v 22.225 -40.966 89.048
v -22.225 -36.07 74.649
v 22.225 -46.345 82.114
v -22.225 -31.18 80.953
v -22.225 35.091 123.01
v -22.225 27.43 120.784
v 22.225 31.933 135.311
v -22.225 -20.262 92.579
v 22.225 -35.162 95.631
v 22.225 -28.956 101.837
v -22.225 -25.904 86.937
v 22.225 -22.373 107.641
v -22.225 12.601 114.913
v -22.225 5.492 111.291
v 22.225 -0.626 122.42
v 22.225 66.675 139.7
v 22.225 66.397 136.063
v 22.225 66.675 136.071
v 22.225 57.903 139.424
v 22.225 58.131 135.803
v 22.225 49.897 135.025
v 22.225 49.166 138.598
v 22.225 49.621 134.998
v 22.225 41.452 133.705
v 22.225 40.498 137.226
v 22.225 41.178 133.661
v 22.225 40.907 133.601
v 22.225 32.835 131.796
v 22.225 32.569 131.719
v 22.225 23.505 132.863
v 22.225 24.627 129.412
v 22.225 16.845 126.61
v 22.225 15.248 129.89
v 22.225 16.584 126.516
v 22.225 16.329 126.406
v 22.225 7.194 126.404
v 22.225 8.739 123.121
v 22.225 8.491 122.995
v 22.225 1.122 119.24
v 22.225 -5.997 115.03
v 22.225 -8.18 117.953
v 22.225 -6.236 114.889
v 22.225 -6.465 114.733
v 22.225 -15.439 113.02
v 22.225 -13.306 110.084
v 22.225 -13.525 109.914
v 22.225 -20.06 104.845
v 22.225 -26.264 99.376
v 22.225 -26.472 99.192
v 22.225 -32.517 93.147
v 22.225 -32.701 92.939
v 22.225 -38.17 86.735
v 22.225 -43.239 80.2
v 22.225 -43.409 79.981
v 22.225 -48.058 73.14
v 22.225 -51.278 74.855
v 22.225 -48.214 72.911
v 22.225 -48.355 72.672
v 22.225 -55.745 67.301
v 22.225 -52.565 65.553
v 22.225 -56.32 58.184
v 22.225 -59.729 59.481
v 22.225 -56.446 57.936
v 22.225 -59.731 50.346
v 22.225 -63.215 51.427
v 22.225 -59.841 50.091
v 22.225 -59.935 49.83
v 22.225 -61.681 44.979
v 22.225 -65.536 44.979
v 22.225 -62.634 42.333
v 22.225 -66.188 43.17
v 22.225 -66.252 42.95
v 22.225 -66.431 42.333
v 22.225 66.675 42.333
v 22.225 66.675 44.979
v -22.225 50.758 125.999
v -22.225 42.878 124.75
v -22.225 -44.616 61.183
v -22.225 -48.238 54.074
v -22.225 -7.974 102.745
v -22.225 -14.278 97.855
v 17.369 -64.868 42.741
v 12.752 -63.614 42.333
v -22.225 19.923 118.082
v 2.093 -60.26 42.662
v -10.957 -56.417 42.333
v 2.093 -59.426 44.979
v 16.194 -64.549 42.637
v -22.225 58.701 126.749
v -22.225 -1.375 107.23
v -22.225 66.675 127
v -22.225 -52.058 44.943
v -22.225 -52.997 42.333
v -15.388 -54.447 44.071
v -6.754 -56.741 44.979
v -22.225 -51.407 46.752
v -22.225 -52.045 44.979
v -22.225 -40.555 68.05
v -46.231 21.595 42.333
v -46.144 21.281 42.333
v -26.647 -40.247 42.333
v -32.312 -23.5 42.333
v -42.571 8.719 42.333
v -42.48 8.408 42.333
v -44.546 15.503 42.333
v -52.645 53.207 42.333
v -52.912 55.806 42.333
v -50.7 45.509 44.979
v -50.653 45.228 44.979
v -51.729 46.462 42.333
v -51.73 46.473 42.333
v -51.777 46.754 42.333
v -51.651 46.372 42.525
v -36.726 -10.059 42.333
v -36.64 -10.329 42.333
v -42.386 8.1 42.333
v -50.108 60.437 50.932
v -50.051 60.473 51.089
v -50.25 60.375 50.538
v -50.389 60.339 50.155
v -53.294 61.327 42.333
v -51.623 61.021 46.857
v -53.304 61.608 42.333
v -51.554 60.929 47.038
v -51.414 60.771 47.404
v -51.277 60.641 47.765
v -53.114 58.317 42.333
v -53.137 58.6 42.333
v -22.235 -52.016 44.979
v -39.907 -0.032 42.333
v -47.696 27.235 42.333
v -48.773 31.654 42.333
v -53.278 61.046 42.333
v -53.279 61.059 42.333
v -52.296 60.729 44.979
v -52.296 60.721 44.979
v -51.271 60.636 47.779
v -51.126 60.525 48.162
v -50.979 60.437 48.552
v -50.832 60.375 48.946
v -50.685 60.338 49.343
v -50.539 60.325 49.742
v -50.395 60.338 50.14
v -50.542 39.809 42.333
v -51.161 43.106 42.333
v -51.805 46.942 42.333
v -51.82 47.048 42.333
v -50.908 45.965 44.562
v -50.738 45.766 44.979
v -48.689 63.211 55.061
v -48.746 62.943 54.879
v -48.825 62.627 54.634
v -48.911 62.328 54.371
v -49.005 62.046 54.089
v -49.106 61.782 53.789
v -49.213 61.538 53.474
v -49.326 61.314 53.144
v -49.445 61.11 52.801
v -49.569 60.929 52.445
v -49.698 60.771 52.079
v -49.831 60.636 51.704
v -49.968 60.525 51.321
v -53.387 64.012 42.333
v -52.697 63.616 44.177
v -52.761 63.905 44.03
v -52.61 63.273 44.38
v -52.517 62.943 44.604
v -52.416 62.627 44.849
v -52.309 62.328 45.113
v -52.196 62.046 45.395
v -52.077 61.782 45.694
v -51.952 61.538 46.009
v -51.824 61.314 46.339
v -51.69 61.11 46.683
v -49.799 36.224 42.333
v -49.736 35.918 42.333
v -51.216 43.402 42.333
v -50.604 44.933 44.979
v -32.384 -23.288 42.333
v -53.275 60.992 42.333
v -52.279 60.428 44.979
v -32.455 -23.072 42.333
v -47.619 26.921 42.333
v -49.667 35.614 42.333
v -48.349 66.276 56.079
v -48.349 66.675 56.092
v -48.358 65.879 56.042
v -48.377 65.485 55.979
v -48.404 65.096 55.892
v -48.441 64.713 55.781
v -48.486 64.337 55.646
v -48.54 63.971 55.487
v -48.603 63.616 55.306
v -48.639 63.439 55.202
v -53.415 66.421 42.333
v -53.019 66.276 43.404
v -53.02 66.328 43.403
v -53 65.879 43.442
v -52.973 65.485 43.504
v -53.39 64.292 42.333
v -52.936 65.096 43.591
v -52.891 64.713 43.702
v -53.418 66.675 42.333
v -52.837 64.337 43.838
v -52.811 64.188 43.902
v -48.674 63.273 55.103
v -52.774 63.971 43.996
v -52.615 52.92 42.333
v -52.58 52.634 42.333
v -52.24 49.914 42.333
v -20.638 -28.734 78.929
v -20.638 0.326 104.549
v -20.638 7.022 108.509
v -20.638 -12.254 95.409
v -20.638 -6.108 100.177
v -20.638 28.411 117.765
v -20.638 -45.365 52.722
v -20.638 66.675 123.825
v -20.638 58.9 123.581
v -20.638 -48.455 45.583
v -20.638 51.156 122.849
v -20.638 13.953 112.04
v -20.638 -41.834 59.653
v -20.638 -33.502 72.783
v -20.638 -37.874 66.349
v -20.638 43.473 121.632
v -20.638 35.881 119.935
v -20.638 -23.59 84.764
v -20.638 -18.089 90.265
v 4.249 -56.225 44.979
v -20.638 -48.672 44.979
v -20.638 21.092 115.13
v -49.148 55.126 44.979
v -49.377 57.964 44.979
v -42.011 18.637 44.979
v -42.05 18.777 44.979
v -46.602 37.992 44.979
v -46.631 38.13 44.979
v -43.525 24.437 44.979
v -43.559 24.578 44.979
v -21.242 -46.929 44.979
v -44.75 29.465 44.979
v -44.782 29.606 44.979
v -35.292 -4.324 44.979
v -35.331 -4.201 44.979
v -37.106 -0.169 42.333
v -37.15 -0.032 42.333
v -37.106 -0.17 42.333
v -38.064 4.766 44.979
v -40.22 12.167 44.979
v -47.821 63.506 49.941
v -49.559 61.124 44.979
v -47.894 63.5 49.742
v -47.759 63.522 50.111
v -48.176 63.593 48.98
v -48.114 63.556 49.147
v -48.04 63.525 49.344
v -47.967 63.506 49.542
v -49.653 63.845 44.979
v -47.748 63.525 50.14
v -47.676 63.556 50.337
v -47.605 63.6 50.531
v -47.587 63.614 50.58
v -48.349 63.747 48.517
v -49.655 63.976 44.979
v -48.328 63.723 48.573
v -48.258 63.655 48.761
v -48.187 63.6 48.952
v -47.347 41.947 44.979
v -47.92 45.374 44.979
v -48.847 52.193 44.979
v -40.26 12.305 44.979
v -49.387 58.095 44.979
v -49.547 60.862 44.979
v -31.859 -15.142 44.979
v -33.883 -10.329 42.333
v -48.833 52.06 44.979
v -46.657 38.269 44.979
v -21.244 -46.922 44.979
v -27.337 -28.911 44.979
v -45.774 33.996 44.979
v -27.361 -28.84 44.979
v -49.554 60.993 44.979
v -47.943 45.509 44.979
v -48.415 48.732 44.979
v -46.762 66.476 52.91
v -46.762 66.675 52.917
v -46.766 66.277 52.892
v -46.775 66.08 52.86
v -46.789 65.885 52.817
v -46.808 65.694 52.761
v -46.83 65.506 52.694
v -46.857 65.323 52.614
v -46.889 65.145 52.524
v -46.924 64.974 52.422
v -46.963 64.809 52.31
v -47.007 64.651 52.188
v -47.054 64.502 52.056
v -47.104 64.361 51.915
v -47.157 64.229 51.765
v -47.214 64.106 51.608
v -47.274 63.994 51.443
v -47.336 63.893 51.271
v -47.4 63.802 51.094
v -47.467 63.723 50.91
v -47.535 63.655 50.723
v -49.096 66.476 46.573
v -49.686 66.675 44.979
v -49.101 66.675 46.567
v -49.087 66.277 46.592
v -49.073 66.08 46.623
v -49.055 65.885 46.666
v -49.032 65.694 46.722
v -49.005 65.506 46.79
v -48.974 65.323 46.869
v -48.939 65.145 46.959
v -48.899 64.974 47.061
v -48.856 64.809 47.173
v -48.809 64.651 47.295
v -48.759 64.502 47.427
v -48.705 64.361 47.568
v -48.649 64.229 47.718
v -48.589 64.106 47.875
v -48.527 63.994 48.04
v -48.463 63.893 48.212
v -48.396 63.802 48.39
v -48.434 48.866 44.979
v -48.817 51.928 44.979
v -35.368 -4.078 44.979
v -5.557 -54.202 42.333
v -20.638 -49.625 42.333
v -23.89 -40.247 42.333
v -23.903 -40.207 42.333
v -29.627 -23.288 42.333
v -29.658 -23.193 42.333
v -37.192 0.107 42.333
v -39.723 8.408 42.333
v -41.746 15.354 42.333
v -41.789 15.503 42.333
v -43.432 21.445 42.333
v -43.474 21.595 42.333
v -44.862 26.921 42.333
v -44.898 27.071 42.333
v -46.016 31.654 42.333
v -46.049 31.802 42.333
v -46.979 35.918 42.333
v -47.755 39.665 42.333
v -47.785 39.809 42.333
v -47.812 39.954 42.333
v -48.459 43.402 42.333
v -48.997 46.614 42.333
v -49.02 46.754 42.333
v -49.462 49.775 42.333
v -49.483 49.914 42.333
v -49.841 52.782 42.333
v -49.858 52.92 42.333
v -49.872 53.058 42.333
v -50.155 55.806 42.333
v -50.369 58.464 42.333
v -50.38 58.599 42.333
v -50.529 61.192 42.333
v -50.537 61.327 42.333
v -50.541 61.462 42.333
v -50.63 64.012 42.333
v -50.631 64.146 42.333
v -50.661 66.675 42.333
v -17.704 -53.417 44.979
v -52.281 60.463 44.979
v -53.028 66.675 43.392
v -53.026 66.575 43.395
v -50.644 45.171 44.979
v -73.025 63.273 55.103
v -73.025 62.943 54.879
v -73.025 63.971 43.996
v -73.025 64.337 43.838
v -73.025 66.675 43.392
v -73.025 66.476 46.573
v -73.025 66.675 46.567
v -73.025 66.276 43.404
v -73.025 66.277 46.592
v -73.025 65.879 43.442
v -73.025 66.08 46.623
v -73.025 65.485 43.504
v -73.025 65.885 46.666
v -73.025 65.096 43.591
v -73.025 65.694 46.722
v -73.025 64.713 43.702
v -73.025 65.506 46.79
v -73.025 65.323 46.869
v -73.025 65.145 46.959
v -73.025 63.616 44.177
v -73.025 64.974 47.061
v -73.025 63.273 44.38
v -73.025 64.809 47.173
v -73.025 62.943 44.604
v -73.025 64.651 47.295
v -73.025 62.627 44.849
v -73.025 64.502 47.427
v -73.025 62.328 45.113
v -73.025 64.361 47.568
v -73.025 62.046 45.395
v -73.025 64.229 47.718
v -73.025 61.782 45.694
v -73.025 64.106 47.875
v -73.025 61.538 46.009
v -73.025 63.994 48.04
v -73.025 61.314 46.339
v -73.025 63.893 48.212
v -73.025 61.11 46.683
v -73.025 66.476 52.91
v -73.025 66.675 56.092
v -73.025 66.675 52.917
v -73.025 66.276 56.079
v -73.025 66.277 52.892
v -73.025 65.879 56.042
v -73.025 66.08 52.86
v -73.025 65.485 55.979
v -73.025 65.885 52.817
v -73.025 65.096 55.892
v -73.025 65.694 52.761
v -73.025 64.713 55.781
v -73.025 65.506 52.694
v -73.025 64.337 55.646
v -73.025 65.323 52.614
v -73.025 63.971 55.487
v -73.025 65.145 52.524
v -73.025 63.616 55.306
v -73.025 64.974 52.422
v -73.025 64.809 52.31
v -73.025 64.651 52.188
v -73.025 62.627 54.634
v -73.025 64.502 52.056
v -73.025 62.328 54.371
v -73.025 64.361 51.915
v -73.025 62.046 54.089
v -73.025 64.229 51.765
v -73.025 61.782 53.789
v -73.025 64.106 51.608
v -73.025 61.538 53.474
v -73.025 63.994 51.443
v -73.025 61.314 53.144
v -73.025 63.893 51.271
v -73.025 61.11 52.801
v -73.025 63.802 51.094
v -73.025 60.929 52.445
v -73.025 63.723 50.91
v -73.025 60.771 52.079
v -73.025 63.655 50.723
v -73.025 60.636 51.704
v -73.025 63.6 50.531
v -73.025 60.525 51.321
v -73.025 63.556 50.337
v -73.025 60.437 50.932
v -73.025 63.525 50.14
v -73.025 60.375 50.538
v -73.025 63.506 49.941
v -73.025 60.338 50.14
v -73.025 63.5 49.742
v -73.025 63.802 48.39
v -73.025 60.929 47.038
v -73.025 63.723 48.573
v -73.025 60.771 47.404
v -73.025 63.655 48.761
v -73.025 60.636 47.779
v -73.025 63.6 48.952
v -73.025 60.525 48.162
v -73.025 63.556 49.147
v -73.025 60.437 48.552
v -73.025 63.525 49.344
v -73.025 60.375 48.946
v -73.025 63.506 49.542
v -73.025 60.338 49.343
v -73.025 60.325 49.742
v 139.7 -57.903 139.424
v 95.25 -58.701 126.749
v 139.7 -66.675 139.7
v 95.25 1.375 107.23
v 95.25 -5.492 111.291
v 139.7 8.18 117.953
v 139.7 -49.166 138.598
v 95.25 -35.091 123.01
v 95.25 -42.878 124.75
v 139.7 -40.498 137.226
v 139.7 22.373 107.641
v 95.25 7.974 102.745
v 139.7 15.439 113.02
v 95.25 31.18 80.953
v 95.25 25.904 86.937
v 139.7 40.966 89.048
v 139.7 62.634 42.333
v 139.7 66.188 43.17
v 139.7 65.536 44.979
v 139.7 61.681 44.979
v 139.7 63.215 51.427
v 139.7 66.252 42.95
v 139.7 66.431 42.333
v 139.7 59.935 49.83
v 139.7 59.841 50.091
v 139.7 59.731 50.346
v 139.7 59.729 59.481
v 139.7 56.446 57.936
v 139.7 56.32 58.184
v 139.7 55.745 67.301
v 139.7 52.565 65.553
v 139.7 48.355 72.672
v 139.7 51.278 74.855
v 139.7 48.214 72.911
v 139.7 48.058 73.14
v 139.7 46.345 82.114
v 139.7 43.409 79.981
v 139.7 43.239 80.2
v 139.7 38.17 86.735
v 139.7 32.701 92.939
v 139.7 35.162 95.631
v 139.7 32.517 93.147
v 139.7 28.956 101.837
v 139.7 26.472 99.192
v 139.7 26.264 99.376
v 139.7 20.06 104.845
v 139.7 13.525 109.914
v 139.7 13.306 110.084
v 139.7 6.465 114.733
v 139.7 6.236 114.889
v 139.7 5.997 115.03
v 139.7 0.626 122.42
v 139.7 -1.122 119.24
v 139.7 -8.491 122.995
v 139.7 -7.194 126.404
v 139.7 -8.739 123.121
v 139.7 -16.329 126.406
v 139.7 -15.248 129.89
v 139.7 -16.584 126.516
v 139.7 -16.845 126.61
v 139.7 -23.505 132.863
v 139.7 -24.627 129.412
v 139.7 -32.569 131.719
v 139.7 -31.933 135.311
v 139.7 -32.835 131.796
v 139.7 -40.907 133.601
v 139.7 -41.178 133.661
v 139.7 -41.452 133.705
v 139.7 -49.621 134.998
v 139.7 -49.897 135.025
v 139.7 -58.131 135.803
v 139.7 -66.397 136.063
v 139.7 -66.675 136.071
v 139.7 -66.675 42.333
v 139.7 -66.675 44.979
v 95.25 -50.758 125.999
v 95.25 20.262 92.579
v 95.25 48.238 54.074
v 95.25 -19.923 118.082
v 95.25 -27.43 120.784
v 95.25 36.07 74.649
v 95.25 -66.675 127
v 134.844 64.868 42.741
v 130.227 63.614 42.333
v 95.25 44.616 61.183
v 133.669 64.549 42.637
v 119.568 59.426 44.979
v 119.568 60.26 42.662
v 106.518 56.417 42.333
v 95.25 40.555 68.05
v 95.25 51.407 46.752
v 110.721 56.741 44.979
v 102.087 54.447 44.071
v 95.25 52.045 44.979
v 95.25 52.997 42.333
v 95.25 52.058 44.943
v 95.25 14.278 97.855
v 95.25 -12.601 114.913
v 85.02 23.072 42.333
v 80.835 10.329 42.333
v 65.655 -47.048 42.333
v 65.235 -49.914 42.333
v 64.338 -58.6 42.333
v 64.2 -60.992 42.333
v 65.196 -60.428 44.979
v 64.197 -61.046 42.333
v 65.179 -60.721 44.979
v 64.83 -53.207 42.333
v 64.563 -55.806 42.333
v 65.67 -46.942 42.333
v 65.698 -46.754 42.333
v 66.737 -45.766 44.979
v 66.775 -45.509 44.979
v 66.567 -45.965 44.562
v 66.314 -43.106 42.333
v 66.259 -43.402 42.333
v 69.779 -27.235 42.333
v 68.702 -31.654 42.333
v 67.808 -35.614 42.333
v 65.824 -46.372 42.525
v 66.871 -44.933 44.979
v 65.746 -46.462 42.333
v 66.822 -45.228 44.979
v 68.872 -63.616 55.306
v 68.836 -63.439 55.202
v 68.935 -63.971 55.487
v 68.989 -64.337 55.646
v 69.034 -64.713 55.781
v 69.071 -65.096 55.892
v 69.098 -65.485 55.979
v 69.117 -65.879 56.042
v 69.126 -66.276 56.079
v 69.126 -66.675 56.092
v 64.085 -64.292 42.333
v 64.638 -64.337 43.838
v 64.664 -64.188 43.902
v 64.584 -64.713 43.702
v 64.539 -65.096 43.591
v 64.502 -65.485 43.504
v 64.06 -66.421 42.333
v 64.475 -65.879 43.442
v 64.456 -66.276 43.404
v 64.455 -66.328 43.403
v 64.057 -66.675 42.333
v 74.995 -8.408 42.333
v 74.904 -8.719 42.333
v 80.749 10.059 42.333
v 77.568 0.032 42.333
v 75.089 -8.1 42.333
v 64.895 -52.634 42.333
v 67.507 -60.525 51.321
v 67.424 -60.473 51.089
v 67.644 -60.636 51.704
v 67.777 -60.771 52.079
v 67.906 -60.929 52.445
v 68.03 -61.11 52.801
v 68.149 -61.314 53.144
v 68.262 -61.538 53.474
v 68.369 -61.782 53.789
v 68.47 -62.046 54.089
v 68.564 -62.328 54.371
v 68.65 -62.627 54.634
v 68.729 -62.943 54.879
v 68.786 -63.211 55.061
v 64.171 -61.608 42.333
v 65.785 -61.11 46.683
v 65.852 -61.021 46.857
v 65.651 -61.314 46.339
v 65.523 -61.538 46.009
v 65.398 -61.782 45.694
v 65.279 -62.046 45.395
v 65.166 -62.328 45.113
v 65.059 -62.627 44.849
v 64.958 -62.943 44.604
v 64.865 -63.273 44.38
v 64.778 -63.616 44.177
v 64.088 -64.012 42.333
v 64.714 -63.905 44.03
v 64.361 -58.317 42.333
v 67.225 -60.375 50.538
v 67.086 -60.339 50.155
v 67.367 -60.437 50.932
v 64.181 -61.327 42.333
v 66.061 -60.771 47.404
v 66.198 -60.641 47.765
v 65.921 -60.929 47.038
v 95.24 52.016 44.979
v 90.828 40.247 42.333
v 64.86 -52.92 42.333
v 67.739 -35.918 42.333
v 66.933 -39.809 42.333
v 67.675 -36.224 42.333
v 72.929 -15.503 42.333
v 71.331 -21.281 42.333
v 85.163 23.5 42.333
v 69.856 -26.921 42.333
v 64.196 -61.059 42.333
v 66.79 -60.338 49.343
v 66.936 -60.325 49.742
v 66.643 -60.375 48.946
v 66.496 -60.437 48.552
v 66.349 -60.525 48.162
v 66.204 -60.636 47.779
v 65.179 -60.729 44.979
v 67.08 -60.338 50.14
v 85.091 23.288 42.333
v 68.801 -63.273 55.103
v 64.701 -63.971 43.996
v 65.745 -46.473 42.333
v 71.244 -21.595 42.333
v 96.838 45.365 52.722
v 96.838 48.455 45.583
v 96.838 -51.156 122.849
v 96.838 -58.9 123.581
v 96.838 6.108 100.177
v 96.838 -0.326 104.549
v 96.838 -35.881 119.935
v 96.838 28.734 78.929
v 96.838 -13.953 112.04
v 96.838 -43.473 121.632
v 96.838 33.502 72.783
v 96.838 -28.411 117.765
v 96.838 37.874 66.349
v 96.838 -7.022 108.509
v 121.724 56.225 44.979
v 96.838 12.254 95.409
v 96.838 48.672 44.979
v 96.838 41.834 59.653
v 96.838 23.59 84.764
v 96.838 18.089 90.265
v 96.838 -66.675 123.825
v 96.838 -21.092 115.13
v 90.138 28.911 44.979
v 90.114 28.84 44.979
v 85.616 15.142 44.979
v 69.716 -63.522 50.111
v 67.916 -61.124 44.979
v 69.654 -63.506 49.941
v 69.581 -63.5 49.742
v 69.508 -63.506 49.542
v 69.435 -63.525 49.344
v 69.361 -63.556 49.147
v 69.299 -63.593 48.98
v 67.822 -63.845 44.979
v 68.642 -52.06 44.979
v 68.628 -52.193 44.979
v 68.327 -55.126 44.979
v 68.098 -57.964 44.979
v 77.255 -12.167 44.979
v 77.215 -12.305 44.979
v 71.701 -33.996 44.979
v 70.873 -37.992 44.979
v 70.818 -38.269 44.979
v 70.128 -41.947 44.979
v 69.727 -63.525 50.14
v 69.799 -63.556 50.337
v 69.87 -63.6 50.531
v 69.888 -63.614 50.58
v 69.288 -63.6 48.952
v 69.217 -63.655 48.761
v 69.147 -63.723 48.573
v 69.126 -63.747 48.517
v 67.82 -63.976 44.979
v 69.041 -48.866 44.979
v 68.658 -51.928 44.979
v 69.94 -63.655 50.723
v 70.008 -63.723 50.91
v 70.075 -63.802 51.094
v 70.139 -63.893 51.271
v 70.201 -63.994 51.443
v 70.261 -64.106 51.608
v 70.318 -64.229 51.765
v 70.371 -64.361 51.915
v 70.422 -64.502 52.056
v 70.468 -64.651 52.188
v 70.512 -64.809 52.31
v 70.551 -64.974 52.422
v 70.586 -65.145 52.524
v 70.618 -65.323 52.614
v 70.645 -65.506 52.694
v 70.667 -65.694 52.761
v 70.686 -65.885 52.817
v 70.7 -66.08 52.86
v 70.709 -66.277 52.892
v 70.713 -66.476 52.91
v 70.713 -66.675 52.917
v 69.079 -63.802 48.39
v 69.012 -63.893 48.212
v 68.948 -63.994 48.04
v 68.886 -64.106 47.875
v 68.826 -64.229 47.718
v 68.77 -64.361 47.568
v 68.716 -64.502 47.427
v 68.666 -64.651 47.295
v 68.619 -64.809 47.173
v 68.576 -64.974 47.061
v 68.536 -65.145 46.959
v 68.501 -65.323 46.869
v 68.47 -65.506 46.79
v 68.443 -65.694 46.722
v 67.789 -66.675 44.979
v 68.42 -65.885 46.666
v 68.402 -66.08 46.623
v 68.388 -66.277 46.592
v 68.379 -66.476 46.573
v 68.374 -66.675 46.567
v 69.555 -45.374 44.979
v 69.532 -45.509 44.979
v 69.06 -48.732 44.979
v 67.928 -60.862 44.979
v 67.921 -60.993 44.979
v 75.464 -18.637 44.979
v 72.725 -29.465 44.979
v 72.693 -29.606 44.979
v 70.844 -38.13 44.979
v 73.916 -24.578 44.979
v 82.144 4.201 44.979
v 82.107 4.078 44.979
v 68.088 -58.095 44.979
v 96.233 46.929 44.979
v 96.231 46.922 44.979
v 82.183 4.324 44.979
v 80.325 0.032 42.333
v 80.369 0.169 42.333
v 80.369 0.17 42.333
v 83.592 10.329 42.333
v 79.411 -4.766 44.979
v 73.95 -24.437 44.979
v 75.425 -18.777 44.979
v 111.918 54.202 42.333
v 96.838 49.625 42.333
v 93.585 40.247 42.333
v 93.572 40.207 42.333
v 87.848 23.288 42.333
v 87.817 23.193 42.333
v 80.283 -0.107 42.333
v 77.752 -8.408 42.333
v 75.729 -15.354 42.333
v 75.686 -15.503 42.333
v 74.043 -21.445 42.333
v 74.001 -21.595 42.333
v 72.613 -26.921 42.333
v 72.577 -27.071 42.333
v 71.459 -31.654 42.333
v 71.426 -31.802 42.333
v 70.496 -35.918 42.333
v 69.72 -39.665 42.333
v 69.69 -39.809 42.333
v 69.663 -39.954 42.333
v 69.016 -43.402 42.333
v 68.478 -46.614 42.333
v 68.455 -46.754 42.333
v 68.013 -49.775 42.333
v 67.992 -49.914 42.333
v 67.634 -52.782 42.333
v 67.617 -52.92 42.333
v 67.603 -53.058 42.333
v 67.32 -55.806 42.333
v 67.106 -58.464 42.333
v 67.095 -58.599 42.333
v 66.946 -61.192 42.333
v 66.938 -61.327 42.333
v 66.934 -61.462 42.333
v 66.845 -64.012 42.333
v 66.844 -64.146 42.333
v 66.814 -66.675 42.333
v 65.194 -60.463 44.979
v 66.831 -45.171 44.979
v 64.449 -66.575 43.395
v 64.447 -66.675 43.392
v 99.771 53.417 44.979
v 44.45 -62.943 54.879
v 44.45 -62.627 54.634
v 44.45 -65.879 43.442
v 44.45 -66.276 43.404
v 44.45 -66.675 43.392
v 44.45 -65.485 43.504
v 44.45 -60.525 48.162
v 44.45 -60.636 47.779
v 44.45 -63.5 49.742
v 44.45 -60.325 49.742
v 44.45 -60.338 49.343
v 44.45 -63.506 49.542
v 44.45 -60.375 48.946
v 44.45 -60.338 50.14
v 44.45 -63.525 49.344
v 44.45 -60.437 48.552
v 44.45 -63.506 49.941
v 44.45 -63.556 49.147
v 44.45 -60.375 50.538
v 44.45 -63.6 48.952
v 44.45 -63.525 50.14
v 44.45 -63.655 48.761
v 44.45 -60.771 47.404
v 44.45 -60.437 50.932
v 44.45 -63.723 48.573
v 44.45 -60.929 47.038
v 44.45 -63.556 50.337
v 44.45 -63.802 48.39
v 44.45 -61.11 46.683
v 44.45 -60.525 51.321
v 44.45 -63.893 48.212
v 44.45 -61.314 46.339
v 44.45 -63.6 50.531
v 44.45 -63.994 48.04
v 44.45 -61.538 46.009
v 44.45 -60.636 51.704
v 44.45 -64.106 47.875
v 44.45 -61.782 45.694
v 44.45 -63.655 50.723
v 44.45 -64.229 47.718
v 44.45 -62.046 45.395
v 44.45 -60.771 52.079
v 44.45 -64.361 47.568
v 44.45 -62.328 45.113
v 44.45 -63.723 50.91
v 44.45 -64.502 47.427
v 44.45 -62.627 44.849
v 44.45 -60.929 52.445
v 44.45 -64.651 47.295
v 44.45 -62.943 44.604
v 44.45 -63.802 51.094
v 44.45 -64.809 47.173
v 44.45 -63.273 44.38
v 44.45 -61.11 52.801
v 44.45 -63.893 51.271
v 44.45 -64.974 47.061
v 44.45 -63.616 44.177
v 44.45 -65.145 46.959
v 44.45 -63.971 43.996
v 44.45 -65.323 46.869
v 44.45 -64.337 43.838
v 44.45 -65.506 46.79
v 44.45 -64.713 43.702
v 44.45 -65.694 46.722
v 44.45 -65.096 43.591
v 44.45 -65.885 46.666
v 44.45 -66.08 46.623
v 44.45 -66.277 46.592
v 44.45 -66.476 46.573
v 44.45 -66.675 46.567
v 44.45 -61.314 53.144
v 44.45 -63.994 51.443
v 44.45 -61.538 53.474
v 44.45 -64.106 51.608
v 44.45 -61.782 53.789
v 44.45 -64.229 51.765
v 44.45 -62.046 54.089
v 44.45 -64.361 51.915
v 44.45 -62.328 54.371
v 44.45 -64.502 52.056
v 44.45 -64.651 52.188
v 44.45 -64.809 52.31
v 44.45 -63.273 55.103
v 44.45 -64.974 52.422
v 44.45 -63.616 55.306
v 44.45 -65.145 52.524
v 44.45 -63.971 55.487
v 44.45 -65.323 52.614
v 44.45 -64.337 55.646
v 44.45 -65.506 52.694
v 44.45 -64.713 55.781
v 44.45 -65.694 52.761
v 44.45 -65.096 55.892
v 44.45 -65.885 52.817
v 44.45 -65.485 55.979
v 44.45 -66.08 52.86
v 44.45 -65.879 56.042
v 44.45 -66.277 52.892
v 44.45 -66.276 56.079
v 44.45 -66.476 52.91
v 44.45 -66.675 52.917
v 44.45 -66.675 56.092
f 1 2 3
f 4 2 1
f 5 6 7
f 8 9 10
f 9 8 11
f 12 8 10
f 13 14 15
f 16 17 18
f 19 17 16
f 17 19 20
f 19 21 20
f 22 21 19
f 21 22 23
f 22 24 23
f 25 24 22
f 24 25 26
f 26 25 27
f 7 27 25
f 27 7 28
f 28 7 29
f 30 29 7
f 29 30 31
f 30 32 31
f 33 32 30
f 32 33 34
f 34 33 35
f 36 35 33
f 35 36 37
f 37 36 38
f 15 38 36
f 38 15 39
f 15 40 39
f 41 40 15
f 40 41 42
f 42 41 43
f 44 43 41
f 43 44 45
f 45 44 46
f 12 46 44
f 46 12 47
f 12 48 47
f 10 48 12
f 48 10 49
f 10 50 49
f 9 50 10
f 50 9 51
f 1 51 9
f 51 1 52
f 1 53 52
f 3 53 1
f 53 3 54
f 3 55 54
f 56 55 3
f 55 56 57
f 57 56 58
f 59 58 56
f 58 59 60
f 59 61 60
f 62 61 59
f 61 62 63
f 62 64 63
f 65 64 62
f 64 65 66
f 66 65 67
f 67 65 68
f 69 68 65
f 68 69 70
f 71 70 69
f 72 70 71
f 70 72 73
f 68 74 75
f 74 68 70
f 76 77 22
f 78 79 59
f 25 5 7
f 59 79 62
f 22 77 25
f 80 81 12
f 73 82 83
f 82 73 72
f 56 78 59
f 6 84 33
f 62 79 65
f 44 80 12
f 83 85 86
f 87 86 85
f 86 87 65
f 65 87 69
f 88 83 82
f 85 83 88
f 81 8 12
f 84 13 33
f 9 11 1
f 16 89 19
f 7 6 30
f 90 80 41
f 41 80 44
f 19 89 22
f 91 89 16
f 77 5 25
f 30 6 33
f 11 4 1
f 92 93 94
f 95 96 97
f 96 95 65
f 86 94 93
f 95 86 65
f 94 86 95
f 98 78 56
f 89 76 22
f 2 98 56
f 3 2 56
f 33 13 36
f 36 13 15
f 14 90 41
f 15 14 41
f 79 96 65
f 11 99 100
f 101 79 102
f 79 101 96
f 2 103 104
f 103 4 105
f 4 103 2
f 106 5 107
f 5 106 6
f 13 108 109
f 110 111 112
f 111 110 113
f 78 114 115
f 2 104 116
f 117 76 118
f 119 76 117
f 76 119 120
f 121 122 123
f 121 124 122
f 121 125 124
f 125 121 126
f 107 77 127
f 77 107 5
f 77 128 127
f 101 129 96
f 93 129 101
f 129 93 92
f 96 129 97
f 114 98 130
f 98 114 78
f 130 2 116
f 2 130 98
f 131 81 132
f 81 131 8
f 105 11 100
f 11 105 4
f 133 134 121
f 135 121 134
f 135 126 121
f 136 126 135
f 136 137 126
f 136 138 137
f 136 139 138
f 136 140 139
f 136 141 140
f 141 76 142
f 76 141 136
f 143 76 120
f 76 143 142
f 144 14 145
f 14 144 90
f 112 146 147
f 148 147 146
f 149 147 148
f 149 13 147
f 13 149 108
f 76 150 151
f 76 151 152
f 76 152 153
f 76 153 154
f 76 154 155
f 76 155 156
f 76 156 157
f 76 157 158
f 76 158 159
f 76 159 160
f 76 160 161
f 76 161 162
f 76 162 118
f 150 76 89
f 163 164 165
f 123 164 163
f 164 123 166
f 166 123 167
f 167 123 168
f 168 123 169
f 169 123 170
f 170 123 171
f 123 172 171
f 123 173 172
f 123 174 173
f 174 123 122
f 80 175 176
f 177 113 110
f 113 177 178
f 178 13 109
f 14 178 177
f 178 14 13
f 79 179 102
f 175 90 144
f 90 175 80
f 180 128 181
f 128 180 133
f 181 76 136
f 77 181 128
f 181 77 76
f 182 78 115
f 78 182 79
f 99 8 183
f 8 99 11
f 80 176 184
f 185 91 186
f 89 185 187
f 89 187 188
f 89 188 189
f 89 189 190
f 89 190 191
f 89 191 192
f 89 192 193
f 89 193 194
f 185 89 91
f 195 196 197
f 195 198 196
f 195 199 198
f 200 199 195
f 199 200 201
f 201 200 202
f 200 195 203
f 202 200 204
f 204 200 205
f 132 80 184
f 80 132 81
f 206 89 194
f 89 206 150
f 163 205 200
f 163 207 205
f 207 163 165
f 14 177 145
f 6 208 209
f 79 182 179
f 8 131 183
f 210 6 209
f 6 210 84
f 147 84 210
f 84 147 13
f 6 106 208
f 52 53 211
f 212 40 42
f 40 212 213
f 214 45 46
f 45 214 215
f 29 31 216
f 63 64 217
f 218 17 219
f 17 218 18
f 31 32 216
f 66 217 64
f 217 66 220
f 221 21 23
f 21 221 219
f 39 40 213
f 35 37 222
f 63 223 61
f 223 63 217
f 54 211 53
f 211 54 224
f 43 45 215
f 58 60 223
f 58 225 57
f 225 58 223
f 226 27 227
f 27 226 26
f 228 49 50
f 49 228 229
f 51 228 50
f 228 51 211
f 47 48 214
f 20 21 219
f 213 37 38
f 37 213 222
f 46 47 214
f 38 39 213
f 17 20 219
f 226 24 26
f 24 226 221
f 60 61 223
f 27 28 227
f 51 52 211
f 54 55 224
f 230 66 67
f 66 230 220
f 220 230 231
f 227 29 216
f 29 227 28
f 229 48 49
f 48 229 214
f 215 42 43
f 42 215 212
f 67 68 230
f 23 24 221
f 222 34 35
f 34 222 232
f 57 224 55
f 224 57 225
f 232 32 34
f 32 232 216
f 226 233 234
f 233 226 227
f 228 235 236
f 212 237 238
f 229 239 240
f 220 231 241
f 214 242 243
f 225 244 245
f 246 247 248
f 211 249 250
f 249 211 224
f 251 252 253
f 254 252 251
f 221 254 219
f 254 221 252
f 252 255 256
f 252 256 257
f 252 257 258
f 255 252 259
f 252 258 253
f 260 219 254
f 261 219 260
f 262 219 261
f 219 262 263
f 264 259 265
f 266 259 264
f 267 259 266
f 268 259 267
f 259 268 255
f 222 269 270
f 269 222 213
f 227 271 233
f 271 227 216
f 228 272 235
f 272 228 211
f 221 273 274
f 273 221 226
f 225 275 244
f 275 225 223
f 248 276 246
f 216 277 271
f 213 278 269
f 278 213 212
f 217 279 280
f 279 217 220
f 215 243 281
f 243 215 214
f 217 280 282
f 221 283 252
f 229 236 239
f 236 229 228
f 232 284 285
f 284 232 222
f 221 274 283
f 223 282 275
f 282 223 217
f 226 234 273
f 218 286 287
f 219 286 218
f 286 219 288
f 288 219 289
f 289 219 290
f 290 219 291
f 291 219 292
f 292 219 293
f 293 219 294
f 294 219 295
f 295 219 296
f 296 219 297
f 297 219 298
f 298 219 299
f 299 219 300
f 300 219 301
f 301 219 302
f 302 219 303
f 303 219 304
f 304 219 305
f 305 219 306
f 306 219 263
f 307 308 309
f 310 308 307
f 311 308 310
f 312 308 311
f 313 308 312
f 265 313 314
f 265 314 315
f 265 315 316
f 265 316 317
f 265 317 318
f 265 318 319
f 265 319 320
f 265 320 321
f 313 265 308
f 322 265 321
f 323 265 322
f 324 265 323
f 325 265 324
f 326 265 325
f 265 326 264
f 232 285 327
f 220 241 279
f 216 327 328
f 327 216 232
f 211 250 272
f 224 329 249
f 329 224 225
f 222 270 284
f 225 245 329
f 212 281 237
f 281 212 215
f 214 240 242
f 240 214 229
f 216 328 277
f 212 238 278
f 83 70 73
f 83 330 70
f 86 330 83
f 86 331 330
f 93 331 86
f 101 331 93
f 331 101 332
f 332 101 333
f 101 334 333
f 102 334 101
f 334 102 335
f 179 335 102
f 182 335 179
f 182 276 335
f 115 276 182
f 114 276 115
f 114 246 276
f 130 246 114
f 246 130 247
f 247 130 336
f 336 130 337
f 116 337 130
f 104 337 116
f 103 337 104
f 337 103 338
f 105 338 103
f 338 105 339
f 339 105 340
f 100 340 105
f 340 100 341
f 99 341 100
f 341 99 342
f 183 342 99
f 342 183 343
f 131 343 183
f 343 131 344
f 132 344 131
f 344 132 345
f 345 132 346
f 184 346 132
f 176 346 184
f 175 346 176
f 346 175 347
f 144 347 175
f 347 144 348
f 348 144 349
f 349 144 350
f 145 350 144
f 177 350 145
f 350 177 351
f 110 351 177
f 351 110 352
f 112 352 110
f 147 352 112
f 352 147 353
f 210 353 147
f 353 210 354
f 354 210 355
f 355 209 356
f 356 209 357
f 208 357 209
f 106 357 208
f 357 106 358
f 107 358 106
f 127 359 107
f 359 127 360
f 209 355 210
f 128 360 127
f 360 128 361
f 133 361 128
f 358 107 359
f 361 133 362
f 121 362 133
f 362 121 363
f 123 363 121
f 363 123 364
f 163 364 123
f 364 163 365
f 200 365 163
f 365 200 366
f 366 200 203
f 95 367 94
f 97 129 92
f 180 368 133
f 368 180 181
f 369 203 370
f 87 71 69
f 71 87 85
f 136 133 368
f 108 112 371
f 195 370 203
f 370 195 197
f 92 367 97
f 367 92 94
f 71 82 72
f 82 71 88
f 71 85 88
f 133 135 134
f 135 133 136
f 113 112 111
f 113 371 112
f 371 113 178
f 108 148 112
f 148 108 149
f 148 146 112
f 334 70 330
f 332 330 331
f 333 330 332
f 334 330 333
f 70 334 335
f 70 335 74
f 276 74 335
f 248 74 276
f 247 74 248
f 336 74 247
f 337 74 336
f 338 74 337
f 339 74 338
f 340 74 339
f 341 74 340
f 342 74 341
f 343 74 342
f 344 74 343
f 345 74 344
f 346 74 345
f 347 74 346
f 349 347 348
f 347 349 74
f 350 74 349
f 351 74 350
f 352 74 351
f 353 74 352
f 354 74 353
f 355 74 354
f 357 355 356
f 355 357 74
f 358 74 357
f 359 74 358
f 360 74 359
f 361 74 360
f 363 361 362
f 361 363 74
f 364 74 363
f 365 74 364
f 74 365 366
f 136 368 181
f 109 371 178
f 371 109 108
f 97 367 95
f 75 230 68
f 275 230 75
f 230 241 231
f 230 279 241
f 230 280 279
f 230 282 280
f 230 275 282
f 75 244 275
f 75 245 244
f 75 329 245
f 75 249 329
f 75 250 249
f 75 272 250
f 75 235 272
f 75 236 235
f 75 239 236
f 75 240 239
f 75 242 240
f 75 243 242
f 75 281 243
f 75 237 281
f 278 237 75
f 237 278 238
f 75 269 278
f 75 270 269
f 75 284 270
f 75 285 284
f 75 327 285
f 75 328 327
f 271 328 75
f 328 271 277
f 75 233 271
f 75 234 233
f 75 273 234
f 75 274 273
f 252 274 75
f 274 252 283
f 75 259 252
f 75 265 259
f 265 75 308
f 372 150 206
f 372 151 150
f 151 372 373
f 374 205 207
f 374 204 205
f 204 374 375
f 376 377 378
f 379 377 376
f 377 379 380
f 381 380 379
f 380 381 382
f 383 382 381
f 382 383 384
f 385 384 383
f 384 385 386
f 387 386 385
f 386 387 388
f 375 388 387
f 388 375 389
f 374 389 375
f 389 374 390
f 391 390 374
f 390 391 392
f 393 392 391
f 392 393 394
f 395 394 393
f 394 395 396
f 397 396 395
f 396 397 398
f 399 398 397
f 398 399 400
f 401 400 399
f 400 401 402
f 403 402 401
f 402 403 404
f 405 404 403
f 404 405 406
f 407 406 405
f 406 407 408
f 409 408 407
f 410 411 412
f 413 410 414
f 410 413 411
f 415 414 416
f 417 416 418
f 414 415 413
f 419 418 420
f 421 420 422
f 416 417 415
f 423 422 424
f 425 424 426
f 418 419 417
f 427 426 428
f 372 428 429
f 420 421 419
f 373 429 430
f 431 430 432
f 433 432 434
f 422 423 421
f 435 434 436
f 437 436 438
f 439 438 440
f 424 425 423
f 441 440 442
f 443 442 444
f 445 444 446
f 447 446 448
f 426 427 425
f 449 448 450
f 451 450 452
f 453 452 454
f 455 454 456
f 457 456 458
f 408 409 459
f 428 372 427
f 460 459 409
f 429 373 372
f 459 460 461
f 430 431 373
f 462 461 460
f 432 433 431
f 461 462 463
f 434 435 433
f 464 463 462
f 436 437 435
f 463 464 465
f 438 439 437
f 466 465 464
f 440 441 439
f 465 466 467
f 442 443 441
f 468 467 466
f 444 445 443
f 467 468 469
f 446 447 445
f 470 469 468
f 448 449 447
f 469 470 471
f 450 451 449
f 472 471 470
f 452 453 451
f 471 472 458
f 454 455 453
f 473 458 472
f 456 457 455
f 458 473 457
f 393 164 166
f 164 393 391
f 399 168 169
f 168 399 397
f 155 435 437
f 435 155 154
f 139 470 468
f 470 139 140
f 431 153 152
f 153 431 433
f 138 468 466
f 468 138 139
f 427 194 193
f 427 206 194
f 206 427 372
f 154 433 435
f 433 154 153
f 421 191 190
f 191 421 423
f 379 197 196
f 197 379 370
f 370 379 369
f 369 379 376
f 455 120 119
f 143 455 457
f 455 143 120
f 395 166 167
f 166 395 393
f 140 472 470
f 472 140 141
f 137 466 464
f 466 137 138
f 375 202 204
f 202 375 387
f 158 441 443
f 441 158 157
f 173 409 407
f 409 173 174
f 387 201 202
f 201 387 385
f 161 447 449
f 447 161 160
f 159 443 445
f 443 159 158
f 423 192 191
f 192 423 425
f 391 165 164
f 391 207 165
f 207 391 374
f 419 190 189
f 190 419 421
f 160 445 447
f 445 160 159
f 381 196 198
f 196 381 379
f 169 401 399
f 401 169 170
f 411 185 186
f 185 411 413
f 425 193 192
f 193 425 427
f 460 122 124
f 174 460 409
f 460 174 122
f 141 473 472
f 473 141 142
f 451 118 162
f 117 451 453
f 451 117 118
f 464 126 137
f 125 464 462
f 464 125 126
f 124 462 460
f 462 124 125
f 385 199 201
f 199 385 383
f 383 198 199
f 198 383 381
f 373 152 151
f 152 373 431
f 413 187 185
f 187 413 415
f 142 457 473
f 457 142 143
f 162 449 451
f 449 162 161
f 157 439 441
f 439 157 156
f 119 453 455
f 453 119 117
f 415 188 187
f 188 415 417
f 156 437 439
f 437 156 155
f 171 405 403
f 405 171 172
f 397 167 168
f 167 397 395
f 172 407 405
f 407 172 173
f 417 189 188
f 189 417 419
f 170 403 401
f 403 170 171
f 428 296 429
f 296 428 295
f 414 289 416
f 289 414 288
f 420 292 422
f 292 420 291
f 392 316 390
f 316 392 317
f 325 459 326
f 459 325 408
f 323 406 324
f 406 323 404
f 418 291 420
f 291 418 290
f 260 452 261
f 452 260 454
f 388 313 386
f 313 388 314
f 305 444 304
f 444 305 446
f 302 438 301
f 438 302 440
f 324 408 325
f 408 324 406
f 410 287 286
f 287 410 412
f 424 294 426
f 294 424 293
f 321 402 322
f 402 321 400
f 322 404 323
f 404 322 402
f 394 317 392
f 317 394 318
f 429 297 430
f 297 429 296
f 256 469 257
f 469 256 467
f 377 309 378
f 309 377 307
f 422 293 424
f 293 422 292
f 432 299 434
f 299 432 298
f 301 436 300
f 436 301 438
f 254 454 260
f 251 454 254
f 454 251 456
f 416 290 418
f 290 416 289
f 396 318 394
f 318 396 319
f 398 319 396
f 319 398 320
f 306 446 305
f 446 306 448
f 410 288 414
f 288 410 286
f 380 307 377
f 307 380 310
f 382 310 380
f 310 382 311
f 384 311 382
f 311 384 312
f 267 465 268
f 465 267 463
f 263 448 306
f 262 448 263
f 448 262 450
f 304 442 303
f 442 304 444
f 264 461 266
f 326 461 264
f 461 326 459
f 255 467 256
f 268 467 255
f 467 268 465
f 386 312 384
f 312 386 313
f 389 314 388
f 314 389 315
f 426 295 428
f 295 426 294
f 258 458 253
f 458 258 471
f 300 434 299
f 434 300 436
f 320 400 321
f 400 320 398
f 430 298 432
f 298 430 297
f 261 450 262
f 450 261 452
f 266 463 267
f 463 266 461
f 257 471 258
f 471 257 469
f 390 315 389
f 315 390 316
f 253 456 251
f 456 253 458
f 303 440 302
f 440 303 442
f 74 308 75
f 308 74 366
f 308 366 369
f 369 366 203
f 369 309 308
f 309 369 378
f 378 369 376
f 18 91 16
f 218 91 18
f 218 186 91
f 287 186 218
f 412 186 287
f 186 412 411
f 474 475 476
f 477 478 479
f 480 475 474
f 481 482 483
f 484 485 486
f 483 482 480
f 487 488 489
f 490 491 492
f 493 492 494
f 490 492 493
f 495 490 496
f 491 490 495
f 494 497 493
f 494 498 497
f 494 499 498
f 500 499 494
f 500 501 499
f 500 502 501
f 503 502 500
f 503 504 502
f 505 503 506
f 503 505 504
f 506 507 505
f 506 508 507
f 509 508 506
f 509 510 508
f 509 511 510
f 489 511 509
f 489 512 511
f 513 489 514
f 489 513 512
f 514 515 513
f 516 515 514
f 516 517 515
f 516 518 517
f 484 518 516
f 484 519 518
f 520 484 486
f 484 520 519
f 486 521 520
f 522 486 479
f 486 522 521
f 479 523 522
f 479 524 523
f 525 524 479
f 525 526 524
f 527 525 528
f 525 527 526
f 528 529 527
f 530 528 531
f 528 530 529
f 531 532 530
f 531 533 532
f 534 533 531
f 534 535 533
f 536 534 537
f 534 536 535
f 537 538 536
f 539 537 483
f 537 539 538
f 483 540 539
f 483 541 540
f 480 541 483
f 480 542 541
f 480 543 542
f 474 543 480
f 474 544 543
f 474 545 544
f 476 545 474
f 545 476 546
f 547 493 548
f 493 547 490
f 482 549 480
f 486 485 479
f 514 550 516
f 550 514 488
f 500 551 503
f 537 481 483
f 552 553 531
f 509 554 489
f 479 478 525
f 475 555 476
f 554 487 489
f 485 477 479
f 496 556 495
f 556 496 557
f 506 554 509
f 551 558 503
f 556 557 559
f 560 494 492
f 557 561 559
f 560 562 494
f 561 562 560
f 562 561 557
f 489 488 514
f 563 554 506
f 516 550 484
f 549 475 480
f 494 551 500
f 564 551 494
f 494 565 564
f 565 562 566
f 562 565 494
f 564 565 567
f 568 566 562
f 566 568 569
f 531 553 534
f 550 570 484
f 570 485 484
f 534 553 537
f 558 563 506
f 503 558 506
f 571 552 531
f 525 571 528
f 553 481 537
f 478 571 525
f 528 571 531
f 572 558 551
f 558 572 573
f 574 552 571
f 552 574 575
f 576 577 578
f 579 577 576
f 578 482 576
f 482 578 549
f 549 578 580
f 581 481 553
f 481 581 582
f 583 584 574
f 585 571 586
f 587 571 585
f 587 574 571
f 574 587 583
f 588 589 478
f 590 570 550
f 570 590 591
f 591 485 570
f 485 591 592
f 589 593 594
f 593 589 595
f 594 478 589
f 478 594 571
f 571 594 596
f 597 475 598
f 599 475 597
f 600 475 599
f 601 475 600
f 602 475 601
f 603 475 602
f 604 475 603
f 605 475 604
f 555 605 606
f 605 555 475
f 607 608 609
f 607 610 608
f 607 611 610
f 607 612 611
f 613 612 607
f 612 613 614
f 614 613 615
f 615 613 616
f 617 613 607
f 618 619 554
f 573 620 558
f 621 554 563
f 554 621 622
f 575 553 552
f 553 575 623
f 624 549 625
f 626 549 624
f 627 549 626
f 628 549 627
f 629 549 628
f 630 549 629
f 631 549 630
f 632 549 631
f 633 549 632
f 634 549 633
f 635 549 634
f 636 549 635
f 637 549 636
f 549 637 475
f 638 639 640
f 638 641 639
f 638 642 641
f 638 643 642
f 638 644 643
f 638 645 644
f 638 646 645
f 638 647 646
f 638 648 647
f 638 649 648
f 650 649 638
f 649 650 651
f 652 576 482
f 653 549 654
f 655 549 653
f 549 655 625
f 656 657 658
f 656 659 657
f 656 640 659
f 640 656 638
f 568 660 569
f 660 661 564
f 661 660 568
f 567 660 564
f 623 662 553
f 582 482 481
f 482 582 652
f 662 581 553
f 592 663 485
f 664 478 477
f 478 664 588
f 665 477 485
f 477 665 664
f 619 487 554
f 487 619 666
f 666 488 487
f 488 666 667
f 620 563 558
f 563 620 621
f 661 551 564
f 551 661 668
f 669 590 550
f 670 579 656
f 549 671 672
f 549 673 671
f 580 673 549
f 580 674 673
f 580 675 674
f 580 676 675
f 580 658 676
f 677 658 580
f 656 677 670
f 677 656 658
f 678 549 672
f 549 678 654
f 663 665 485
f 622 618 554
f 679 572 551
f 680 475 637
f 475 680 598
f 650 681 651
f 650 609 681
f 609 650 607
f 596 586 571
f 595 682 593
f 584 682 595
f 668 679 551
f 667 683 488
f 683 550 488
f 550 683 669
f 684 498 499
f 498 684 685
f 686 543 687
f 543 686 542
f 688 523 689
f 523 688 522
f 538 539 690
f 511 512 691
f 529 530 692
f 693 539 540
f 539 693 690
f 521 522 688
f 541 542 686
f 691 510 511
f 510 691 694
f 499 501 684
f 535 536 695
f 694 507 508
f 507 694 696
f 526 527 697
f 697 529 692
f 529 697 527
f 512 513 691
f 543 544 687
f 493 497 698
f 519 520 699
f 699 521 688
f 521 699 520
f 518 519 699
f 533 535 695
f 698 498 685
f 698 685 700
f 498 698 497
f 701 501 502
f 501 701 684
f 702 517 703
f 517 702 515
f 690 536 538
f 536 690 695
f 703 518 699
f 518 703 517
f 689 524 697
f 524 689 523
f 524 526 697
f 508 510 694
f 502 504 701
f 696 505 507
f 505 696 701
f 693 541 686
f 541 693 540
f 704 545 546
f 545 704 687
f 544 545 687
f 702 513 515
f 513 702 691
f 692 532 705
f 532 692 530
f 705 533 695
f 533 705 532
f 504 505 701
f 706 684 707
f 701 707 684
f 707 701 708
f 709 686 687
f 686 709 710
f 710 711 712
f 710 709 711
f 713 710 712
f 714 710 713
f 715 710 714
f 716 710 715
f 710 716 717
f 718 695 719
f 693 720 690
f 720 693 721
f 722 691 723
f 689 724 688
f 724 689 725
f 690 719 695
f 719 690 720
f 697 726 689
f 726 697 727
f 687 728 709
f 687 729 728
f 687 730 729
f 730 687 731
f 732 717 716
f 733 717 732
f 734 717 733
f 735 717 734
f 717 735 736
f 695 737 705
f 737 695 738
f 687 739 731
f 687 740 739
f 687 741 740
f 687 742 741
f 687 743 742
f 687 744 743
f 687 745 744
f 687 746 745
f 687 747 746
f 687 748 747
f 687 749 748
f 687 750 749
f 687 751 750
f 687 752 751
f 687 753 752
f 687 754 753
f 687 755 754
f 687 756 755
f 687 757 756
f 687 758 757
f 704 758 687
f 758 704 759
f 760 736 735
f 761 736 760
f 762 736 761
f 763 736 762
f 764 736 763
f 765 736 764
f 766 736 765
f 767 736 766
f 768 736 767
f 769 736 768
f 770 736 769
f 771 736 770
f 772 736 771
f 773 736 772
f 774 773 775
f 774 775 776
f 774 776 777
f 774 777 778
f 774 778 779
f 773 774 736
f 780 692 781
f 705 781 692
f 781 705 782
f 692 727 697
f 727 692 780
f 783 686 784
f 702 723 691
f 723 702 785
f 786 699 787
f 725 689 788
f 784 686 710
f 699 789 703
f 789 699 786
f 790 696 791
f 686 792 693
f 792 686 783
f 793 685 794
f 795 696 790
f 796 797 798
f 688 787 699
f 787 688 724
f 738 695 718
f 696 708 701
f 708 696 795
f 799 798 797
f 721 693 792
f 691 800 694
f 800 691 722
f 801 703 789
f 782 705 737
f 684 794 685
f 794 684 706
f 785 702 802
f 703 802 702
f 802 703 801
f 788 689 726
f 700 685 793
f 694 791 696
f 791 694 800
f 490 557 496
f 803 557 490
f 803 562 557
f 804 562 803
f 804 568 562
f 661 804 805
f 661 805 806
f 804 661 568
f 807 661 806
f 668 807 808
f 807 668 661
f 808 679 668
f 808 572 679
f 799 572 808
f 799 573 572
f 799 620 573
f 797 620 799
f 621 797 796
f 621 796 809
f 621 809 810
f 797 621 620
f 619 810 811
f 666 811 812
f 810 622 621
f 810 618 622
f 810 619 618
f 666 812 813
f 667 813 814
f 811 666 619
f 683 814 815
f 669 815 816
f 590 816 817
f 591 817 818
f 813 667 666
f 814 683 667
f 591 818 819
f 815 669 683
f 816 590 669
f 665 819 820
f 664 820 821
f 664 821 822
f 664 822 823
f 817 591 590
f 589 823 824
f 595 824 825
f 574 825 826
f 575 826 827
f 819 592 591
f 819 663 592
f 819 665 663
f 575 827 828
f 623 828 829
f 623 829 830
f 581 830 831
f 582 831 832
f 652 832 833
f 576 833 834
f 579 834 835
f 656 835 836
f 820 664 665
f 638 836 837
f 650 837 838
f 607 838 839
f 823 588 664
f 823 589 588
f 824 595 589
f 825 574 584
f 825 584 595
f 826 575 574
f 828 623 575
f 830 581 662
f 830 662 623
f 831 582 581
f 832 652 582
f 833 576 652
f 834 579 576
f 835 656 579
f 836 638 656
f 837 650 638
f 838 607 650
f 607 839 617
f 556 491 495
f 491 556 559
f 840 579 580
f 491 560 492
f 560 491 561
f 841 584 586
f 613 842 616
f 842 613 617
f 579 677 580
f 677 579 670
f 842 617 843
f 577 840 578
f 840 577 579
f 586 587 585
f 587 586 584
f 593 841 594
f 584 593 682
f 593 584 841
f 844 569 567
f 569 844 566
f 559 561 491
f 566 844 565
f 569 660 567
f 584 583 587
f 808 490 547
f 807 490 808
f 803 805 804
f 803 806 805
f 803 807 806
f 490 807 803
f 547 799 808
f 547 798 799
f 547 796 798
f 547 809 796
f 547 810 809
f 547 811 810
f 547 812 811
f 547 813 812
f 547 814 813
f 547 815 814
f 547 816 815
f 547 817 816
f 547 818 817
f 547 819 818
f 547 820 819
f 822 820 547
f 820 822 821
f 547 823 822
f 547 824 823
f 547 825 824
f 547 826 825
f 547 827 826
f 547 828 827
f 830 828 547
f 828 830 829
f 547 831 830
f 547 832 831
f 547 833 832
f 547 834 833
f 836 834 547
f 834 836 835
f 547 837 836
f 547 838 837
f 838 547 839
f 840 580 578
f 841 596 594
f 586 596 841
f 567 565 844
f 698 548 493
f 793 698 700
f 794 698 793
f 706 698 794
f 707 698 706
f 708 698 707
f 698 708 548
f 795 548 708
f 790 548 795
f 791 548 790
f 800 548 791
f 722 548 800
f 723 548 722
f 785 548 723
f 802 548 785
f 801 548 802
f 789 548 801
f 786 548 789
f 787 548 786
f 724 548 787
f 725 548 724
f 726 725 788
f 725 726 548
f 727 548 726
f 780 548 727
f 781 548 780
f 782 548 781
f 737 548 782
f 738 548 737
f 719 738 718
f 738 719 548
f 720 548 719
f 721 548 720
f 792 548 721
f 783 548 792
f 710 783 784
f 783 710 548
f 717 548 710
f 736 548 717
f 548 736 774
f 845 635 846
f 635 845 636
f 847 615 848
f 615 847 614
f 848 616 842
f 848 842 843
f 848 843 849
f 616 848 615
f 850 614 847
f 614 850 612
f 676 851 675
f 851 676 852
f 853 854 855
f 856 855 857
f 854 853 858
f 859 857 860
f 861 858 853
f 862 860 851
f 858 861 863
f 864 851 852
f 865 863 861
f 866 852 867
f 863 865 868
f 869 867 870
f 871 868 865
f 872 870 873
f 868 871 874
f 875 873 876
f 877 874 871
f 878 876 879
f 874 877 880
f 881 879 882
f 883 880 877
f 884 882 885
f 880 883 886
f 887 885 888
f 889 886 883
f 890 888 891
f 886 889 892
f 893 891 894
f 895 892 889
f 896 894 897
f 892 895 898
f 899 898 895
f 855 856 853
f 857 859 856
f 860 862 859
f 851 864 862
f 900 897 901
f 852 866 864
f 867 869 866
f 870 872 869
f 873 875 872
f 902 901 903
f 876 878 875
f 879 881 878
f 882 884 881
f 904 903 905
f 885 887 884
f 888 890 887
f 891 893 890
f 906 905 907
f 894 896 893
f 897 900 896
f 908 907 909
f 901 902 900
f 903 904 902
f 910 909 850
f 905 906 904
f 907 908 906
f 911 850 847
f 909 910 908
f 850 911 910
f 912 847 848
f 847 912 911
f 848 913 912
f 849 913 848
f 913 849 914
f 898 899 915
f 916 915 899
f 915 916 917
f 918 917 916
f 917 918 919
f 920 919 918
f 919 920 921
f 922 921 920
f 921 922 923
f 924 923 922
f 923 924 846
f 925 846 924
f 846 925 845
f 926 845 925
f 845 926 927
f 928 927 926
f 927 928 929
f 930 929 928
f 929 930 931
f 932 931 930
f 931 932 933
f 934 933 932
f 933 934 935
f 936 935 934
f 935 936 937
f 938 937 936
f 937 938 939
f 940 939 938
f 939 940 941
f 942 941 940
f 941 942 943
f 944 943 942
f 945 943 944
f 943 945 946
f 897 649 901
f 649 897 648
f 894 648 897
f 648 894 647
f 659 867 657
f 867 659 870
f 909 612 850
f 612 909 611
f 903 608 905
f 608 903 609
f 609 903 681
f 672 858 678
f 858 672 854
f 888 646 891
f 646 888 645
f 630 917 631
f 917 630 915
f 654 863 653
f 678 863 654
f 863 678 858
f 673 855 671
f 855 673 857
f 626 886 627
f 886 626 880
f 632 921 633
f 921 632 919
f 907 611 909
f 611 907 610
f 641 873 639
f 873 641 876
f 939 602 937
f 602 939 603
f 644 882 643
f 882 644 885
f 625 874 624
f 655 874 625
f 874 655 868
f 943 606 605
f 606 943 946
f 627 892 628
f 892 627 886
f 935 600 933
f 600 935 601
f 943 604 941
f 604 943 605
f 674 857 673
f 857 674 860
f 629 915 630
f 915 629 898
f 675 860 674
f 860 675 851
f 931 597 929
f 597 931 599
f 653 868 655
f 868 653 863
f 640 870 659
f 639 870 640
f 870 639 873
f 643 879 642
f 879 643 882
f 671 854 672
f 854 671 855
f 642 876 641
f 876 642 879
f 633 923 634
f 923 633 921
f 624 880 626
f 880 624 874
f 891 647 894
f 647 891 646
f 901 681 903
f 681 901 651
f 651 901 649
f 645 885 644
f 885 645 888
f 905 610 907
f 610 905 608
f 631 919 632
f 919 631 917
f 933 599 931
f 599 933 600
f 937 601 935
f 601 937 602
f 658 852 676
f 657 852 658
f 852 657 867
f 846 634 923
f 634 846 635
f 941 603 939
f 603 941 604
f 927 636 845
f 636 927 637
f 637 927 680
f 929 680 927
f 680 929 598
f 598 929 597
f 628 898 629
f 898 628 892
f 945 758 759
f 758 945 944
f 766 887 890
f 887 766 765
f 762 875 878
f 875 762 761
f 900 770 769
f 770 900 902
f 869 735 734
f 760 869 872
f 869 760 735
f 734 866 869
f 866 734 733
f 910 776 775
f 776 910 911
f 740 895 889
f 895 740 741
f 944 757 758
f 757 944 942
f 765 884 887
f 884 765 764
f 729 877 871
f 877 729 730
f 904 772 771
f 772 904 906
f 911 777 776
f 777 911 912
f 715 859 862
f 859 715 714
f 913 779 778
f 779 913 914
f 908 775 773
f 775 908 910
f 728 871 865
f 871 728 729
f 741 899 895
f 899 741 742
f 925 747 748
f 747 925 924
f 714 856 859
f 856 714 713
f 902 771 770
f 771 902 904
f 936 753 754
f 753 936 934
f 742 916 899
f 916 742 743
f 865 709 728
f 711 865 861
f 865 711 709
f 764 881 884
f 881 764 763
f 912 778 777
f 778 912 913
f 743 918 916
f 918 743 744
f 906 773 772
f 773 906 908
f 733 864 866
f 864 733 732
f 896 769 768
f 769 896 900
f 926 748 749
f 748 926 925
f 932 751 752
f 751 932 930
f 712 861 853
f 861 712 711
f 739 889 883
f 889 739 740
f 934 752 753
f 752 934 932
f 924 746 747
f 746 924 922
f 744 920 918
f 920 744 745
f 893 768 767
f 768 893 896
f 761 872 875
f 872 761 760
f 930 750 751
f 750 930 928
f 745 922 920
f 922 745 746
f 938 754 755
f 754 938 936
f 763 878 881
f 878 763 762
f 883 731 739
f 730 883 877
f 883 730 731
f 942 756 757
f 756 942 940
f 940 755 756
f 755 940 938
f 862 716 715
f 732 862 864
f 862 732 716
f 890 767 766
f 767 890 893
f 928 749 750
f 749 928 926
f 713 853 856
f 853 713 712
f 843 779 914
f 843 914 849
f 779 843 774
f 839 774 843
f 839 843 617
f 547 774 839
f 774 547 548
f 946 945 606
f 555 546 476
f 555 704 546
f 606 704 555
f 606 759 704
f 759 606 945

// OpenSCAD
//FIX CUTOFF AMOUNT NOT PARAMETRIC YET
//NEED TO COMMENT OUT ALL FUNCTIONS

bucketDiameter = 11;
stage1Height = 1.75;
stage2Height = 1.75;
stage1Reduction = 10;
stage2Reduction = 0.5;

cutoffAmount = 1/3;

sfn=100;
thickness = 0.125;
tubeLength = 0.75;
overlap = 1;
cutoff=0;
largeNumber = 100;

distBetween = 2.5;

diverterHeight = stage1Height+stage2Height+tubeLength;

tubeOverlap = 1;

mode = 1;

module mainDiverter() {
    difference() {
        union() {
            cylinder(r2=bucketDiameter/2, r1=stage1Reduction/2, h=stage1Height, $fn=sfn, center=true);
            translate([0,0,(stage1Height+stage2Height)/-2]) {
                cylinder(r2=stage1Reduction/2, r1=stage2Reduction/2, h=stage2Height, $fn=sfn, center=true);
            }
        }
        translate([0,0,thickness/2]) {
             cylinder(r2=(bucketDiameter-thickness*2)/2, r1=(stage1Reduction-thickness*2)/2, h=stage1Height, $fn=sfn, center=true);
        }
        translate([0,0,(stage1Height+stage2Height-thickness)/-2]) {
                cylinder(r2=(stage1Reduction-thickness*2)/2, r1=(stage2Reduction-thickness*2)/2, h=stage2Height, $fn=sfn, center=true);
        }
    }
}

module partialDiverter() {
    difference() {
        mainDiverter();
        translate([(bucketDiameter+stage2Reduction)/(1/cutoffAmount), 0, (stage1Height+overlap-cutoff)/-2]) {
            cube([bucketDiameter, bucketDiameter, stage1Height+stage2Height+tubeLength+overlap-cutoff], center=true);
        }
    }
}



module coverGuard() {
    intersection() {
        hull() translate([bucketDiameter/(1/cutoffAmount), 0,0]) partialDiverter();
        translate([bucketDiameter/(1/cutoffAmount)/2+thickness,0,(stage1Height/2+thickness+cutoff/2)/-1]) {
            cube([thickness, bucketDiameter, (stage1Height+stage2Height-cutoff/2+thickness*2)], center=true);
        }
    }  
}

module tube() {
    difference() {
        translate([(bucketDiameter/(-1/cutoffAmount))/2-thickness,0,(stage1Height/2+stage2Height/2+tubeLength)/-1+tubeOverlap]) cylinder(r=stage2Reduction/2, h=tubeLength+tubeOverlap*2, $fn=sfn, center=true);
       hull() partialDiverter(); 
    }
}

module fullDiverter() {
    difference() {
        union() {
            partialDiverter();
            translate([bucketDiameter/(-1/cutoffAmount),0,0]) coverGuard();
            tube();
        }
       translate([(bucketDiameter/(-1/cutoffAmount))/2-thickness,0,(stage1Height/2+stage2Height/2+tubeLength)/-1+overlap]) cylinder(r=(stage2Reduction-thickness*2)/2, h=largeNumber, center=true, $fn=sfn);
    }
}

module separation() {
    translate([0,bucketDiameter/4-thickness,0]) rotate([0,90,0]) difference() {
        fullDiverter();
        translate([0,bucketDiameter/4,(diverterHeight+thickness*2)/-4]) cube([bucketDiameter, bucketDiameter/2, diverterHeight+thickness*2], center=true);
    }
    translate([diverterHeight/2+distBetween,bucketDiameter/-4+thickness,0]) rotate([0,90,0]) difference() {
    fullDiverter();
    translate([0,bucketDiameter/-4,(diverterHeight+thickness*2)/-4]) cube([bucketDiameter, bucketDiameter/2, diverterHeight+thickness*2], center=true);
}
}
    
module final() {
    scale([25.4, 25.4, 25.4])  {
        if(mode == 1) {
            separation();
        }
        else if(mode == 2) {
            fullDiverter();
        }
    }
}
final();
